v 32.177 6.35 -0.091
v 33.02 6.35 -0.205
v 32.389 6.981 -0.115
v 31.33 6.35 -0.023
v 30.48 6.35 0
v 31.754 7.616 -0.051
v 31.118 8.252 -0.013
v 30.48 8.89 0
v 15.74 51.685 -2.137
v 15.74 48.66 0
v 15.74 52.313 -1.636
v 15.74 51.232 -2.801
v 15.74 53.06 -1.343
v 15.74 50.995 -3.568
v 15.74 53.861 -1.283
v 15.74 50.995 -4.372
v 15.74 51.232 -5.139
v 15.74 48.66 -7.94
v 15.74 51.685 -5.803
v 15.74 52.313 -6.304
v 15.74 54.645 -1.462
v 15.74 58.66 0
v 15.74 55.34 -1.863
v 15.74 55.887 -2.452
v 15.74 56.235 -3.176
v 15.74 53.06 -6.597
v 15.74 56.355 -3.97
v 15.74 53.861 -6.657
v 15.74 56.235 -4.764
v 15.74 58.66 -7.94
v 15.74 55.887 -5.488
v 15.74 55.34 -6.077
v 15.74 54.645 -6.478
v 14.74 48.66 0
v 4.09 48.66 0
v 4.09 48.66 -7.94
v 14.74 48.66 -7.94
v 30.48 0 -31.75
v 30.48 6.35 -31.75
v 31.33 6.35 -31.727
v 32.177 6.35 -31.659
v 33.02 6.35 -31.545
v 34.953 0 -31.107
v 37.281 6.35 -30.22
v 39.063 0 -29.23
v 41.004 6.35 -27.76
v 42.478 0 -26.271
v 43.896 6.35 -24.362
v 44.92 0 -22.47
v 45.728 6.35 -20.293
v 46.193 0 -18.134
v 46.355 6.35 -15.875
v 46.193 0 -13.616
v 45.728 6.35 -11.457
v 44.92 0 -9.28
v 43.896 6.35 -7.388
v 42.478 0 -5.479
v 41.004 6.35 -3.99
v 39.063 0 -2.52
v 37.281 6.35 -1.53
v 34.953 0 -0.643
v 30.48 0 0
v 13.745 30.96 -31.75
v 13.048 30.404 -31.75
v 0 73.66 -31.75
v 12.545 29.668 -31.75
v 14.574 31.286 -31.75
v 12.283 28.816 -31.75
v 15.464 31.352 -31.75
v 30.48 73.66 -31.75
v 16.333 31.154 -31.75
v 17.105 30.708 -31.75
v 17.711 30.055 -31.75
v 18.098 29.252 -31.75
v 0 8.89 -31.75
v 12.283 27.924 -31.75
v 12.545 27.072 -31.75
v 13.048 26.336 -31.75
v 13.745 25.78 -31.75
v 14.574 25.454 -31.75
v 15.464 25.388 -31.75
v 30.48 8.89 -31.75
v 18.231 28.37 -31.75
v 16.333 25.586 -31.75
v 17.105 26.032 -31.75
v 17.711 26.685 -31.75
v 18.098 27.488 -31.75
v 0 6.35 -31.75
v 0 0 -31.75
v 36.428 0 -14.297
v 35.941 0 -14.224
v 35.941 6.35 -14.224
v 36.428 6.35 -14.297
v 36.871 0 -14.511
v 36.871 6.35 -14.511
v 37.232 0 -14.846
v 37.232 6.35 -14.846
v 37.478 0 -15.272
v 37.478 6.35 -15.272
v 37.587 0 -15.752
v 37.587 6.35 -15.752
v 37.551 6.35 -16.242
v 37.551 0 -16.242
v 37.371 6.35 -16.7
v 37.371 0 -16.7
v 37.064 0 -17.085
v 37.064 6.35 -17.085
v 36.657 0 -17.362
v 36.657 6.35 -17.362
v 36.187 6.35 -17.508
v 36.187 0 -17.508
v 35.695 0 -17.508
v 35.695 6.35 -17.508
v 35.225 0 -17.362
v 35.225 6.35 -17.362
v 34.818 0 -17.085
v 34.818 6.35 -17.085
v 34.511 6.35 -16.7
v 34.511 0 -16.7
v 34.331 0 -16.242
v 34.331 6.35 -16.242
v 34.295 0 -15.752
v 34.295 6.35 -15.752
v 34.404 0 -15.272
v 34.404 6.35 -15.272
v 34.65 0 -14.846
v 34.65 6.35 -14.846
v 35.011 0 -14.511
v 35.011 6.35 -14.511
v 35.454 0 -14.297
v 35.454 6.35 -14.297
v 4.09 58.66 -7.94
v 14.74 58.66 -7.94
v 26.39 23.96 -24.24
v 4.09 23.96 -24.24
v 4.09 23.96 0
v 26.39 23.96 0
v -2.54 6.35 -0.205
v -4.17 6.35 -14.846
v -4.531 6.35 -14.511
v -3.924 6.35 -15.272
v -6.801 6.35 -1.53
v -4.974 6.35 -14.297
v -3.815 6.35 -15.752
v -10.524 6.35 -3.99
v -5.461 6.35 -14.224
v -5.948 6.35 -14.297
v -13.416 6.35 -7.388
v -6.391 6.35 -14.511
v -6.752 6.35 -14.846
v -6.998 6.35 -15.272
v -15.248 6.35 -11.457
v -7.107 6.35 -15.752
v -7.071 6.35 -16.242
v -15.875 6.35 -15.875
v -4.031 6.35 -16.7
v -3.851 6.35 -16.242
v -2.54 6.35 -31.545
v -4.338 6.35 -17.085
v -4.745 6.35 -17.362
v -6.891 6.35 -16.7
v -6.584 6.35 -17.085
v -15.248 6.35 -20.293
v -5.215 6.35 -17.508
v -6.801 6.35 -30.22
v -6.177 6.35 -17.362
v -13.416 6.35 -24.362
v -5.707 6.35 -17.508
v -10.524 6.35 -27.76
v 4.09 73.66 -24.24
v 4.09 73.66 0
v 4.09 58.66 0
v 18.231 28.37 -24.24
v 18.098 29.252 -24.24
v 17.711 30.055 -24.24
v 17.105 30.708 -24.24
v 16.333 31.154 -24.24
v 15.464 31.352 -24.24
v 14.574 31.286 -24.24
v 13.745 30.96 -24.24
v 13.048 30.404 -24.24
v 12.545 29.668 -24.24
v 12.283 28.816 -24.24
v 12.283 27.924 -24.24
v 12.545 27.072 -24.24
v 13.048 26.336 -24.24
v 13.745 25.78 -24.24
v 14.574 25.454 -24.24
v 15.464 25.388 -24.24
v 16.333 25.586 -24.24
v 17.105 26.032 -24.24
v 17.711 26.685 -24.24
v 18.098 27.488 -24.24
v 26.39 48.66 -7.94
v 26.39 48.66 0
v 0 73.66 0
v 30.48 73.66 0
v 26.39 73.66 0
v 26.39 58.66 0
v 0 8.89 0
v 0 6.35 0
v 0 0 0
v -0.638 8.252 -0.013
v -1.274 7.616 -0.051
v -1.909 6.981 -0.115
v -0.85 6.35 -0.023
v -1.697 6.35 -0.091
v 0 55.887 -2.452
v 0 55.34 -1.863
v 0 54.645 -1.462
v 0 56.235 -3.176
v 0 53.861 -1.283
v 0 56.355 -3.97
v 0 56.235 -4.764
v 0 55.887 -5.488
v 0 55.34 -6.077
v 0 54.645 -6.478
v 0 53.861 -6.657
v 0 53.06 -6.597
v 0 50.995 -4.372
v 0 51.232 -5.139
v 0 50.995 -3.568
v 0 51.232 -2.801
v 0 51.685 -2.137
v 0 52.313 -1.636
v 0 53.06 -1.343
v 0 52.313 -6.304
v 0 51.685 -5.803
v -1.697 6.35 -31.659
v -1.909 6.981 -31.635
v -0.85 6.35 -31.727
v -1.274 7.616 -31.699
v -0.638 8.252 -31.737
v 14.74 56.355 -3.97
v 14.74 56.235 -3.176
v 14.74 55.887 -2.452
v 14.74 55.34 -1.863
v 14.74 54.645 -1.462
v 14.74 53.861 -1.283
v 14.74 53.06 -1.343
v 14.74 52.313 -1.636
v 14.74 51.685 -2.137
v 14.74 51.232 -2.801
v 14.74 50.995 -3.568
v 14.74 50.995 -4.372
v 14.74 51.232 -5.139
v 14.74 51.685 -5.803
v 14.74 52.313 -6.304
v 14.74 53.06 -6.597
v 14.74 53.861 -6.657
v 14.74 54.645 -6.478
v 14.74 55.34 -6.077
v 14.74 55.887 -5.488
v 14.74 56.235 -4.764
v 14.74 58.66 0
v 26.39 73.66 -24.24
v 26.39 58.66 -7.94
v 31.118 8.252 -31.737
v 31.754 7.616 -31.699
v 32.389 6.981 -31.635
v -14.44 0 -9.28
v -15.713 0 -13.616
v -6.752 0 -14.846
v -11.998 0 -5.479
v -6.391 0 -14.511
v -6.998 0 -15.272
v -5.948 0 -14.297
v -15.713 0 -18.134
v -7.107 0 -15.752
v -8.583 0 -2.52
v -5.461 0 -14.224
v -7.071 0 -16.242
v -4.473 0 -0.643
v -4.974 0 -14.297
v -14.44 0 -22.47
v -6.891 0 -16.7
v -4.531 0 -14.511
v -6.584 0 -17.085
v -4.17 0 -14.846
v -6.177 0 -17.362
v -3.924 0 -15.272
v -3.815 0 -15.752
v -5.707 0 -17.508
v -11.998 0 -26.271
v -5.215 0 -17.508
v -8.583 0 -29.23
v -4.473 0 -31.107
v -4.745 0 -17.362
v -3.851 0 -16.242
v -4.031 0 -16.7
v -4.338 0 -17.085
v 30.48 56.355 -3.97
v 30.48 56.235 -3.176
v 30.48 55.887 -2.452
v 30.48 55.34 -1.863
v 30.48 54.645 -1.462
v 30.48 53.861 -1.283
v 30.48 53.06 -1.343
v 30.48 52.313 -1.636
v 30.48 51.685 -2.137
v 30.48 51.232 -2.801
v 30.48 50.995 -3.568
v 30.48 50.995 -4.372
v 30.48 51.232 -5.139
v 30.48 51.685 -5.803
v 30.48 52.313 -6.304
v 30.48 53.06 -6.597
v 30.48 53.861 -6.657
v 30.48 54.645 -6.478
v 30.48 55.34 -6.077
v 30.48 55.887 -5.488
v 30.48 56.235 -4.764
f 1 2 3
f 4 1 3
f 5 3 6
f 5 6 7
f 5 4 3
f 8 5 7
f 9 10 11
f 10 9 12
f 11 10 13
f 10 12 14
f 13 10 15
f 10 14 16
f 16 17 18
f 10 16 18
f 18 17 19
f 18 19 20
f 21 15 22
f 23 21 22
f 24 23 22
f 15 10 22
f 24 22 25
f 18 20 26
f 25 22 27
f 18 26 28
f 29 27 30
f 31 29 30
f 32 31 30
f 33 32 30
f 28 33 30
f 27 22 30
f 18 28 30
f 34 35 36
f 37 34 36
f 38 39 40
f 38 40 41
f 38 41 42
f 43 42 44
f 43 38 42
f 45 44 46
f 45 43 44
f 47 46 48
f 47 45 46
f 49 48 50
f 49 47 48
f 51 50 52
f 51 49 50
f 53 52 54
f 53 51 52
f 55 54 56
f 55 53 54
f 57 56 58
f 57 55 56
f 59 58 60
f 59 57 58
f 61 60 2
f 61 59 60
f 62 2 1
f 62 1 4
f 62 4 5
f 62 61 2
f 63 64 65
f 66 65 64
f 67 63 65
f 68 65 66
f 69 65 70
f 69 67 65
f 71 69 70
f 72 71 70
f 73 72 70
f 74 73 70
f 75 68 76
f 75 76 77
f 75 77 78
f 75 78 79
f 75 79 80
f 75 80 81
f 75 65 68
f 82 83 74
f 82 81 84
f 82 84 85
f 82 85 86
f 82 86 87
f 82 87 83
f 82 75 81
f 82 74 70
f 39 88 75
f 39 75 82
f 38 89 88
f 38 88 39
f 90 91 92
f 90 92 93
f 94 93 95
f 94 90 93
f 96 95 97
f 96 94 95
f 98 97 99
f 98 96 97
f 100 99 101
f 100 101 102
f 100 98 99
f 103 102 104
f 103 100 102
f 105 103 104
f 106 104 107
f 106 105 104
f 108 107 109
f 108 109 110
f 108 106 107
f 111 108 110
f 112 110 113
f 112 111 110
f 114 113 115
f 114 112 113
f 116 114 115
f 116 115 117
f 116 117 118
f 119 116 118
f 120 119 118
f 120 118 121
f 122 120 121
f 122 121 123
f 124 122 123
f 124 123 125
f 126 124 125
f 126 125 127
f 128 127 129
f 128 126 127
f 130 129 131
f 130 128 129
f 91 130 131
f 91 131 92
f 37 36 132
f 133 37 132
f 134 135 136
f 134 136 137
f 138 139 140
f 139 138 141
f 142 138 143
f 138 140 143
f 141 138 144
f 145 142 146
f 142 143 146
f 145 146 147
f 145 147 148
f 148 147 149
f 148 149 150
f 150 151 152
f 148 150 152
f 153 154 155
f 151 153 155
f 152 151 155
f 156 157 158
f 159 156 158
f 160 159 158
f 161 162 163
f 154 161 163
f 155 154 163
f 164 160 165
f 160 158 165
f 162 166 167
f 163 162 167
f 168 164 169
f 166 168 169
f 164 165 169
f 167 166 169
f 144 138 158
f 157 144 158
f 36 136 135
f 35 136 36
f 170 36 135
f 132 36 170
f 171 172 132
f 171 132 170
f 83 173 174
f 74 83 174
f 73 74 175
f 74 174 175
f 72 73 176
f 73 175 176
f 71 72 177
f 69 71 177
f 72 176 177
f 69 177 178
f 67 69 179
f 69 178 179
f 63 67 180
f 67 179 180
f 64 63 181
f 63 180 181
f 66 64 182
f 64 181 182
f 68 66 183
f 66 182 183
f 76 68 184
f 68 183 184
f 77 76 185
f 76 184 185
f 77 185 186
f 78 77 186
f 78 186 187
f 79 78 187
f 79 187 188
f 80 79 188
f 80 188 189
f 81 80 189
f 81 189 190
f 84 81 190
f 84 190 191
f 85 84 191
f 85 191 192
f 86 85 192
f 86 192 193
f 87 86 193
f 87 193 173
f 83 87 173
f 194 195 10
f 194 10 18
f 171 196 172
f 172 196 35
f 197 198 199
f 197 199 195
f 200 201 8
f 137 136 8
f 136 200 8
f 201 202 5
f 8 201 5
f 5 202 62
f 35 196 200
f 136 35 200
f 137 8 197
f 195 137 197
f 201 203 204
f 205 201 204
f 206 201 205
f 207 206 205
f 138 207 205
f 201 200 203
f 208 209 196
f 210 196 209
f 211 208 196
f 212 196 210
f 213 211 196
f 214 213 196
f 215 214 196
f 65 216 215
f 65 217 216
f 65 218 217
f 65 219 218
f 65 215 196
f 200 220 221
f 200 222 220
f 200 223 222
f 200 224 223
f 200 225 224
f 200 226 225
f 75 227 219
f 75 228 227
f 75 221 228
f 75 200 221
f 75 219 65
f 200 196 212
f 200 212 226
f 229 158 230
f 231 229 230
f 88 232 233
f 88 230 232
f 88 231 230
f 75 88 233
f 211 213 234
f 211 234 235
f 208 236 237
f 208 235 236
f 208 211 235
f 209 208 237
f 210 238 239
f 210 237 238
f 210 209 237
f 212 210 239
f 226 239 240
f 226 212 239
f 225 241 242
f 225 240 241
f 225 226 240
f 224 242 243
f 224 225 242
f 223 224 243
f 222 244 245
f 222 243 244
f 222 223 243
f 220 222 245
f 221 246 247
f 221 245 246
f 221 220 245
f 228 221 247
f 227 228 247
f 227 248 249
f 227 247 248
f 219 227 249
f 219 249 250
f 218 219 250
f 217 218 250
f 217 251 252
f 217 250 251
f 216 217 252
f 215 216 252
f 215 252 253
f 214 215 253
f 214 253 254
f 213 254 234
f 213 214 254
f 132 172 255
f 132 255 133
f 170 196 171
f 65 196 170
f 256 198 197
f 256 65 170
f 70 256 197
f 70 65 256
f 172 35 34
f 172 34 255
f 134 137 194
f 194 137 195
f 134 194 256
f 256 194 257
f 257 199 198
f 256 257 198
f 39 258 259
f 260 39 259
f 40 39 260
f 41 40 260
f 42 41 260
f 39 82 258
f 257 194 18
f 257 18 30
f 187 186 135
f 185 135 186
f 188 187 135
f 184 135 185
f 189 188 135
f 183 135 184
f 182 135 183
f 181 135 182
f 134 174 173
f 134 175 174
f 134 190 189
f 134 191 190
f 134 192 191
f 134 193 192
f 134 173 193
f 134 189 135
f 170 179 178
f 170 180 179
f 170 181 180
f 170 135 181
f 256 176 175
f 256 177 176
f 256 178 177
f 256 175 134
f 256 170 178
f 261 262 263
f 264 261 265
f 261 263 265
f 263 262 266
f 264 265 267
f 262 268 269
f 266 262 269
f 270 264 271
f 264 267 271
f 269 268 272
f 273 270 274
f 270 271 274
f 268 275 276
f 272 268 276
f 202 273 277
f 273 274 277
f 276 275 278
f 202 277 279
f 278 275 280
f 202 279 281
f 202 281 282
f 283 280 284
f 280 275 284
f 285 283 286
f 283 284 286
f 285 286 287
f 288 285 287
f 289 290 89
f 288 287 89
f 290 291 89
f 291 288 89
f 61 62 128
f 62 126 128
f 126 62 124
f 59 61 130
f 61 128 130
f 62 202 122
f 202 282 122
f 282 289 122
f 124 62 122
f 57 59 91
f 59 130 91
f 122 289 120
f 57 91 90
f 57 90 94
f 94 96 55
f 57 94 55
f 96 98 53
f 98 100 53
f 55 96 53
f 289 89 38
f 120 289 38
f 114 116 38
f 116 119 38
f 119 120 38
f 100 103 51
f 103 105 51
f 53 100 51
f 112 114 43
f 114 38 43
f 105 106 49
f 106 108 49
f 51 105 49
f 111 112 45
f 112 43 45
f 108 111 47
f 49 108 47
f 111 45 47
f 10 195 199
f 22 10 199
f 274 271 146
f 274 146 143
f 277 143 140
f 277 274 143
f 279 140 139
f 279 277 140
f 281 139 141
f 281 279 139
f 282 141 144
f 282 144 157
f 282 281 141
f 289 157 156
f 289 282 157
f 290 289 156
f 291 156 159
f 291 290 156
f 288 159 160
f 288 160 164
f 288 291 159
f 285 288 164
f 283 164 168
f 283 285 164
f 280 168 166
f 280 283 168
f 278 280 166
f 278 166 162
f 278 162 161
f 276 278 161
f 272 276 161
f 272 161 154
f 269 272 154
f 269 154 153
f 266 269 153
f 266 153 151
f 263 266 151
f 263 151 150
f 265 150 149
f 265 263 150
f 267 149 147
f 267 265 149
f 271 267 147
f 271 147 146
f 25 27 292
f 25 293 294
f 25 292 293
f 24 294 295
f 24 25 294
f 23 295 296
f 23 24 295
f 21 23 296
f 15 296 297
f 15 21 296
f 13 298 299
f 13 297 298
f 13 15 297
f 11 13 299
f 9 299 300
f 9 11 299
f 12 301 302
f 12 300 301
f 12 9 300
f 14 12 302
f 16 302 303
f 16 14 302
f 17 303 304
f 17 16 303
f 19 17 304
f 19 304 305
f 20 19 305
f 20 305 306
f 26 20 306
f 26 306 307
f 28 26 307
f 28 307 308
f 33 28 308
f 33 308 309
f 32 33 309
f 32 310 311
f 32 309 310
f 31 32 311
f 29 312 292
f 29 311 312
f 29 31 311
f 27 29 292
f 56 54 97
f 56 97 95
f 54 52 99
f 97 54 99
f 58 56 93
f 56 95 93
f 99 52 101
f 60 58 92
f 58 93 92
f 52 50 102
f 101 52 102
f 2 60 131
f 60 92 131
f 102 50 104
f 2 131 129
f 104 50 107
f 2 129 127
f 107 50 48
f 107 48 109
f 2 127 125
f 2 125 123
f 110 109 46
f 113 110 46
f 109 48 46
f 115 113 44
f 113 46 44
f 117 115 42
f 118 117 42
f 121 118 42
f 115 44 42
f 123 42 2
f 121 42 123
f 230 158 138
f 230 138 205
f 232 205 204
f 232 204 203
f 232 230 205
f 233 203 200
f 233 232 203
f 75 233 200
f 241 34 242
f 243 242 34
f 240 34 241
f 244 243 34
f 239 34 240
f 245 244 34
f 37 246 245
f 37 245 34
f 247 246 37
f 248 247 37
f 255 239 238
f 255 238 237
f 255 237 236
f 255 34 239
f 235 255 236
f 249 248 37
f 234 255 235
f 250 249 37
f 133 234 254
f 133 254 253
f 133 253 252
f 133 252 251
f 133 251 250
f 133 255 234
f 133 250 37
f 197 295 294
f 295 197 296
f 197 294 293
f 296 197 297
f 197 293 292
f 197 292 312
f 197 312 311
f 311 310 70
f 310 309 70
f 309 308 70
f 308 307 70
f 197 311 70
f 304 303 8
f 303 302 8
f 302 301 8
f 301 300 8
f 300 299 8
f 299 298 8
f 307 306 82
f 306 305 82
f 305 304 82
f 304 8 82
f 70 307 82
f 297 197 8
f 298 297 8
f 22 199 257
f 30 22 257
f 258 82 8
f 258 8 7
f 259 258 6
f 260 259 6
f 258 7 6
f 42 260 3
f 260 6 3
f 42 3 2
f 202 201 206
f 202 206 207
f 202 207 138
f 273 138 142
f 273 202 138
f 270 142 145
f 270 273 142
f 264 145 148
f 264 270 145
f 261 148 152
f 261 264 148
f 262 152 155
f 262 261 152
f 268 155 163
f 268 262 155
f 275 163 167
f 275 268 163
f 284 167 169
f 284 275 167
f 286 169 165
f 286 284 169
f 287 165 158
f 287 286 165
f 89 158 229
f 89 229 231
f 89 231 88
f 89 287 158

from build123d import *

# Parameters (mm, degrees)
SKETCH1_R               = 1.651
BOSS_EXTRUDE1_DEPTH     = 6.35
BOSS_EXTRUDE1_2_DEPTH   = 6.35
SKETCH1_3_W             = 30.48
SKETCH1_3_H             = 31.75
BOSS_EXTRUDE2_DEPTH     = 73.66
SKETCH2_W               = 22.3
SKETCH2_H               = 49.699999914
CUT_EXTRUDE1_DEPTH      = 24.240000034
SKETCH3_R               = 2.99085
CUT_EXTRUDE2_DEPTH      = 10.16
CHAMFER1_SIZE           = 2.54
SKETCH4_W               = 7.940000122
SKETCH4_H               = 10
BOSS_EXTRUDE3_DEPTH     = 10.65
CUT_EXTRUDE3_DEPTH      = 87.216972372
CUT_EXTRUDE3_DEPTH_BACK = 87.716972372
CUT_EXTRUDE3_START      = 0.5
SKETCH6_R               = 2.694750008


with BuildPart() as part:
    # Sketch1 → Boss-Extrude1 (new body)
    with BuildSketch(Plane(origin=(0, 0, 0), x_dir=(1, 0, 0), z_dir=(0, 1, 0))):
        with BuildLine():
            ThreePointArc((0, 0), (-15.875, 15.875), (0, 31.75))
            Line((0, 31.75), (0, 0))
        make_face()
        with Locations(Location((-5.461, 15.875, 0), (0, 0, 270))):
            Circle(SKETCH1_R, mode=Mode.SUBTRACT)
    extrude(amount=BOSS_EXTRUDE1_DEPTH)



with BuildPart() as body_2:
    # Sketch1 → Boss-Extrude1 2 (new body)
    with BuildSketch(Plane(origin=(0, 0, 0), x_dir=(1, 0, 0), z_dir=(0, 1, 0))):
        with BuildLine():
            Line((30.48, 0), (30.48, 31.75))
            ThreePointArc((30.48, 31.75), (46.355, 15.875), (30.48, 0))
        make_face()
        with Locations(Location((35.941, 15.875, 0), (0, 0, 270))):
            Circle(SKETCH1_R, mode=Mode.SUBTRACT)
    extrude(amount=BOSS_EXTRUDE1_2_DEPTH)


with BuildPart() as part_1:
    add(part.part)

    add(body_2.part)  # Boss-Extrude2 merges body 2
    # Sketch1<3> → Boss-Extrude2 (add)
    with BuildSketch(Plane(origin=(0, 0, 0), x_dir=(1, 0, 0), z_dir=(0, 1, 0))):
        with Locations((15.24, 15.875)):
            Rectangle(SKETCH1_3_W, SKETCH1_3_H)
    extrude(amount=BOSS_EXTRUDE2_DEPTH)

    # Sketch2 → Cut-Extrude1 (cut)
    with BuildSketch(Plane.XY):
        with Locations((15.24, 48.810000043)):
            Rectangle(SKETCH2_W, SKETCH2_H)
    extrude(amount=-CUT_EXTRUDE1_DEPTH, mode=Mode.SUBTRACT)

    # Sketch3 → Cut-Extrude2 (cut)
    with BuildSketch(Plane.XY.offset(-24.240000034)):
        with Locations((15.24, 28.370000086)):
            Circle(SKETCH3_R)
    extrude(amount=-CUT_EXTRUDE2_DEPTH, mode=Mode.SUBTRACT)

    # Chamfer1
    # the kernel refuses this chamfer: 2.54 mm, written as the material it adds along each edge
    with BuildSketch(Plane(origin=(0, 6.35, -38.282074789), x_dir=(-0.9996219169112966, -0.02749587661058626, 0), z_dir=(0, 0, 1))) as chamfer1_piece_1_section:
        Polygon((CHAMFER1_SIZE * 0.999621916911, -CHAMFER1_SIZE * 0.0274958766106), (-CHAMFER1_SIZE * 0.0274958766106, -CHAMFER1_SIZE * 0.999621916911), (0, 0), align=None)
    chamfer1_piece_1 = extrude(amount=44.814149579, mode=Mode.PRIVATE)
    chamfer1_piece_1 = chamfer1_piece_1 & Plane(origin=(0, 7.197393373, -15.875), x_dir=(0, 0, 1), z_dir=(0, -1, 0)) * Cylinder(15.875, 100, mode=Mode.PRIVATE)
    add(chamfer1_piece_1)
    with BuildSketch(Plane(origin=(30.48, 6.35, 6.532074789), x_dir=(-0.02749587661058591, 0.9996219169112968, 0), z_dir=(0, 0, -1))) as chamfer1_piece_2_section:
        Polygon((CHAMFER1_SIZE * 0.999621916911, CHAMFER1_SIZE * 0.0274958766106), (-CHAMFER1_SIZE * 0.0274958766106, CHAMFER1_SIZE * 0.999621916911), (0, 0), align=None)
    chamfer1_piece_2 = extrude(amount=44.814149579, mode=Mode.PRIVATE)
    chamfer1_piece_2 = chamfer1_piece_2 & Plane(origin=(30.48, 7.197393373, -15.875), x_dir=(0, 0, -1), z_dir=(0, -1, 0)) * Cylinder(15.875, 100, mode=Mode.PRIVATE)
    add(chamfer1_piece_2)

    # Sketch4 → Boss-Extrude3 (add)
    with BuildSketch(Plane(origin=(4.09, 0, 0), x_dir=(0, 0, -1), z_dir=(1, 0, 0))):
        with Locations((3.970000061, 53.66)):
            Rectangle(SKETCH4_W, SKETCH4_H)
    boss_extrude3 = extrude(amount=BOSS_EXTRUDE3_DEPTH)

    # Mirror1: Boss-Extrude3 across plane
    add(boss_extrude3.mirror(Plane(origin=(15.24, 0, 0), x_dir=(0, 0, 1), z_dir=(1, 0, 0))))

    # Sketch6 → Cut-Extrude3 (cut, two sides: drawn at the far end of the back side and taken through both)
    with BuildSketch(Plane(origin=(14.74, 0, 0), x_dir=(0, 0, -1), z_dir=(1, 0, 0)).offset(CUT_EXTRUDE3_START - CUT_EXTRUDE3_DEPTH_BACK)):
        with Locations(Location((3.970000061, 53.66, 0), (0, 0, 90))):
            Circle(SKETCH6_R)
    extrude(amount=CUT_EXTRUDE3_DEPTH + CUT_EXTRUDE3_DEPTH_BACK, mode=Mode.SUBTRACT)


solid = part_1.part
